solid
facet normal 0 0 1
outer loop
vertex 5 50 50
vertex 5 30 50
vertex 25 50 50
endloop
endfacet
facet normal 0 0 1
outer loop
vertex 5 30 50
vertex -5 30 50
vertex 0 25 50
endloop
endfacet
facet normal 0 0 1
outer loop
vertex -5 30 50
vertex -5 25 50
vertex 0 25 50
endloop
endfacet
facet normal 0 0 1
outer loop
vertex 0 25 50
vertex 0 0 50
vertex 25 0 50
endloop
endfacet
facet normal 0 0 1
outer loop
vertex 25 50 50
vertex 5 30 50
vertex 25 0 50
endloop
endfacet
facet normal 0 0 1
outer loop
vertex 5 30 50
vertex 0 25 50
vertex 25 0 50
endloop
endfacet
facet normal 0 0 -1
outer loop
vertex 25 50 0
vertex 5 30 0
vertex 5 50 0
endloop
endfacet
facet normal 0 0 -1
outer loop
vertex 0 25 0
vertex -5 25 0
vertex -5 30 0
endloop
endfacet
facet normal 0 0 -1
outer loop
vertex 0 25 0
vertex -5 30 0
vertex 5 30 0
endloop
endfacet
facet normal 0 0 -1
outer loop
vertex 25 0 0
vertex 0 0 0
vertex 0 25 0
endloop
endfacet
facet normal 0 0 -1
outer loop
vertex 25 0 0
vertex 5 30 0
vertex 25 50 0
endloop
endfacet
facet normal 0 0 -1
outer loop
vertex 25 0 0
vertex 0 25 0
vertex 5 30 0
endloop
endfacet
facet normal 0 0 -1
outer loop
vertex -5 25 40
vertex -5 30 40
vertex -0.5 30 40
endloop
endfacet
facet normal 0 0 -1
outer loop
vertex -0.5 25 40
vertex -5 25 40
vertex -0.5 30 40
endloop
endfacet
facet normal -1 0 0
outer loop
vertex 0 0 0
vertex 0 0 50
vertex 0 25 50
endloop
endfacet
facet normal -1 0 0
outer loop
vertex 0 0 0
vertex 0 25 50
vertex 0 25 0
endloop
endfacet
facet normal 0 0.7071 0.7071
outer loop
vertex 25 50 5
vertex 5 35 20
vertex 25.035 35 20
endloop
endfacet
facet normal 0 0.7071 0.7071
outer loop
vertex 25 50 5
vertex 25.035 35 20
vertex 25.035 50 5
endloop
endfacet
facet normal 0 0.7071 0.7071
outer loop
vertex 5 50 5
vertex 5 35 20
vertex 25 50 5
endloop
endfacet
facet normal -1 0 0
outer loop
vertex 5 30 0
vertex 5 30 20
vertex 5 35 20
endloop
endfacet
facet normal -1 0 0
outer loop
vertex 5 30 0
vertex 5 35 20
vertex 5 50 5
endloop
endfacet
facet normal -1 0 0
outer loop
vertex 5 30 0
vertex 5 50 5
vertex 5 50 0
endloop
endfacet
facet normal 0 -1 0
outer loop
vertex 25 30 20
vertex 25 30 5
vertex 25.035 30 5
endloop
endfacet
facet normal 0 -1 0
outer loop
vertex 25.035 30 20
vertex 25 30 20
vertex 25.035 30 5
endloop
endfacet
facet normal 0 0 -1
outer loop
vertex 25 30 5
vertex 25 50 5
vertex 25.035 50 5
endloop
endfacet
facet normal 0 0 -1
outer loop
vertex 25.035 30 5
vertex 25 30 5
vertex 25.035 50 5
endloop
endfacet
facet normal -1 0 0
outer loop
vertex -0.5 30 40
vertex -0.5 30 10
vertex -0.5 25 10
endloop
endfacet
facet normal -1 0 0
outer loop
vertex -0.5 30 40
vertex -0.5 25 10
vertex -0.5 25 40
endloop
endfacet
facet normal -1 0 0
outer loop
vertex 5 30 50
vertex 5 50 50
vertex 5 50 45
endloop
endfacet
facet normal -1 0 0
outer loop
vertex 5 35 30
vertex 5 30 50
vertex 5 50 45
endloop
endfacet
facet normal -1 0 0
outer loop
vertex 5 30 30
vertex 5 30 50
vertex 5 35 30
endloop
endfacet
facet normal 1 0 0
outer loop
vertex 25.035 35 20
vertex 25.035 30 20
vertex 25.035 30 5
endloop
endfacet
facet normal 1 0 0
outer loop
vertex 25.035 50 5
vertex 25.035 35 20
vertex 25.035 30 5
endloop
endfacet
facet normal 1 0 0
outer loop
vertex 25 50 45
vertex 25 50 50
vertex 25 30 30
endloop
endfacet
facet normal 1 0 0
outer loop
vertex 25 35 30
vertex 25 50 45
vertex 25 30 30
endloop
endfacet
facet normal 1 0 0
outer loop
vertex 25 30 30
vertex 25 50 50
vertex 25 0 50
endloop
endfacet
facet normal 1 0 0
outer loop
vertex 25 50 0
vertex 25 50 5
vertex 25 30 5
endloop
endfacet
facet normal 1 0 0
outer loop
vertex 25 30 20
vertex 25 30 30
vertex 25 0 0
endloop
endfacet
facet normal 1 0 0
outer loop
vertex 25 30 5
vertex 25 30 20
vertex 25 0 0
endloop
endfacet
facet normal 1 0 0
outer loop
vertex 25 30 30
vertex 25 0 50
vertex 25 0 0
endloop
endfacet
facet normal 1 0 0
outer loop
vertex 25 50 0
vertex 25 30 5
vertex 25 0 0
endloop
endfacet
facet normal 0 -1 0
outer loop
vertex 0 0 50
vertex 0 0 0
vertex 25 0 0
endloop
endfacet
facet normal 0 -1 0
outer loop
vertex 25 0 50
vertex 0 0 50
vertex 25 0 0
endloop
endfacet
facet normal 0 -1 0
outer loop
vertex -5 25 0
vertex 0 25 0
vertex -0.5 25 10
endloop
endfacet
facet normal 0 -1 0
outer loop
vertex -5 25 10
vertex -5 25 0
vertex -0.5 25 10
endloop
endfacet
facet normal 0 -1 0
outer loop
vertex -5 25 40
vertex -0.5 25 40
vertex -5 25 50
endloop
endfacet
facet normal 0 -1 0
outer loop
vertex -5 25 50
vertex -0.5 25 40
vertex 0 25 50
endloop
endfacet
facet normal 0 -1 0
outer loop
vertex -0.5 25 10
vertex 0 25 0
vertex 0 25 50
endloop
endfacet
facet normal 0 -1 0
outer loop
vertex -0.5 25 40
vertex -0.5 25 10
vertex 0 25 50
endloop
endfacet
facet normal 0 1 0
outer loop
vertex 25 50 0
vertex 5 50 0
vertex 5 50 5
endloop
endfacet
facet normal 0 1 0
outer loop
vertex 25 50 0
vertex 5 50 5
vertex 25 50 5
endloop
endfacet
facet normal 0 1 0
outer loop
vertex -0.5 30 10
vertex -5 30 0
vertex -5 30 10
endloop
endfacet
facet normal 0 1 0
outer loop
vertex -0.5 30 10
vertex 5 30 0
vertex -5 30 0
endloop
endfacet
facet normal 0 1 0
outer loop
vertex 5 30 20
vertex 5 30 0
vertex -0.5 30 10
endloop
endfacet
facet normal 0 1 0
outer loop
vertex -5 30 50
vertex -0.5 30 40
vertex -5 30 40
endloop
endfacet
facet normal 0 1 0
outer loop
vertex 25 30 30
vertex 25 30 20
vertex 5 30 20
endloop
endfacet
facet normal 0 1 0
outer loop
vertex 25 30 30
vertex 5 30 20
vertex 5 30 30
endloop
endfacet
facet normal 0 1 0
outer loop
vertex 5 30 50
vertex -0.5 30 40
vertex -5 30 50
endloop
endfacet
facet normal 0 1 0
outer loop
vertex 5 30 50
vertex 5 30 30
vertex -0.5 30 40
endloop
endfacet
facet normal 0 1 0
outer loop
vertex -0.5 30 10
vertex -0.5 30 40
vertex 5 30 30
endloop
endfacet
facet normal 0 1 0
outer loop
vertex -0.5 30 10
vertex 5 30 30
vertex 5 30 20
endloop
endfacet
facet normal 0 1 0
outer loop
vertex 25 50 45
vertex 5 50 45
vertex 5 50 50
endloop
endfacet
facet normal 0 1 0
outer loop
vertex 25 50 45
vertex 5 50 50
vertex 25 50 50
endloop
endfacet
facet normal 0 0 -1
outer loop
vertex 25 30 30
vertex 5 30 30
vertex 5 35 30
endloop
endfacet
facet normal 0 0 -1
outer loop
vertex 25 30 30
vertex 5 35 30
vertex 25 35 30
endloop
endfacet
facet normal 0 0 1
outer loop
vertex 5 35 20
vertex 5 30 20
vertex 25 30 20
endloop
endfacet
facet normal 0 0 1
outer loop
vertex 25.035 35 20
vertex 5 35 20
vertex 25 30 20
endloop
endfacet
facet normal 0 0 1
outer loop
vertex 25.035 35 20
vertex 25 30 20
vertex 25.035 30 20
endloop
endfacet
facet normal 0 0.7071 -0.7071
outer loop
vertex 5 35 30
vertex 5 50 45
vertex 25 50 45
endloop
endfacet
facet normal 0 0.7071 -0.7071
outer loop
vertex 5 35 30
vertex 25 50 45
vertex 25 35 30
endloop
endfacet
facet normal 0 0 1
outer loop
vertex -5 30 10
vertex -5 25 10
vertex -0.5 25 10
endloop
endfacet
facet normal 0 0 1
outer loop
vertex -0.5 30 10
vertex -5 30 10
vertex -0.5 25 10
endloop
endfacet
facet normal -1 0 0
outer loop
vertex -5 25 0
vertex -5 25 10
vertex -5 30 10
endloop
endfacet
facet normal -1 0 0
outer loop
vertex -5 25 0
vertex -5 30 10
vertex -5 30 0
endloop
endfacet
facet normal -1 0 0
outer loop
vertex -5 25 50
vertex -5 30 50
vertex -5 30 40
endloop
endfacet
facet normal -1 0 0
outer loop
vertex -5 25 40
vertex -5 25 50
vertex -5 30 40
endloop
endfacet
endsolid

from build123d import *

# Parameters (mm, degrees)
SKETCH1_W            = 25
SKETCH1_H            = 50
BOSS_EXTRUDE1_DEPTH  = 25
SKETCH2_W            = 5
SKETCH2_H            = 10
BOSS_EXTRUDE2_DEPTH  = 5
SKETCH3_W            = 25
SKETCH3_H            = 50
BOSS_EXTRUDE3_DEPTH  = 5
SKETCH4_W            = 5
SKETCH4_H            = 10
BOSS_EXTRUDE5_DEPTH  = 5
SKETCH6_W            = 30.0479401
SKETCH6_H            = 5
BOSS_EXTRUDE6_DEPTH  = 0.5
SKETCH8_W            = 20
SKETCH8_H            = 5
BOSS_EXTRUDE7_DEPTH  = 20
SKETCH18_W           = 20
SKETCH18_H           = 15
BOSS_EXTRUDE9_DEPTH  = 20
CUT_EXTRUDE7_DEPTH   = 20
SKETCH15_W           = 20.034641196
SKETCH15_H           = 15
SKETCH15_W_2         = 20
SKETCH15_H_2         = 20
BOSS_EXTRUDE11_DEPTH = 20
CUT_EXTRUDE9_DEPTH   = 30


with BuildPart() as part:
    # Sketch1 → Boss-Extrude1 (new body)
    with BuildSketch(Plane(origin=(0, 0, 0), x_dir=(1, 0, 0), z_dir=(0, 1, 0))):
        with Locations((12.5, -25)):
            Rectangle(SKETCH1_W, SKETCH1_H)
    extrude(amount=BOSS_EXTRUDE1_DEPTH)



with BuildPart() as body_2:
    # Sketch2 → Boss-Extrude2 (new body)
    with BuildSketch(Plane(origin=(0, 25, 0), x_dir=(1, 0, 0), z_dir=(0, 1, 0))):
        with Locations((-2.5, -5)):
            Rectangle(SKETCH2_W, SKETCH2_H)
    extrude(amount=BOSS_EXTRUDE2_DEPTH)


with BuildPart() as part_1:
    add(part.part)

    add(body_2.part)  # Boss-Extrude3 merges body 2
    # Sketch3 → Boss-Extrude3 (add)
    with BuildSketch(Plane(origin=(0, 25, 0), x_dir=(1, 0, 0), z_dir=(0, 1, 0))):
        with Locations((12.5, -25)):
            Rectangle(SKETCH3_W, SKETCH3_H)
    extrude(amount=BOSS_EXTRUDE3_DEPTH)

    # Sketch4 → Boss-Extrude5 (add)
    with BuildSketch(Plane(origin=(0, 30, 0), x_dir=(1, 0, 0), z_dir=(0, 1, 0))):
        with Locations((-2.5, -45)):
            Rectangle(SKETCH4_W, SKETCH4_H)
    extrude(amount=-BOSS_EXTRUDE5_DEPTH)

    # Sketch6 → Boss-Extrude6 (add)
    with BuildSketch(Plane.ZY):
        with Locations((25.02397005, 27.5)):
            Rectangle(SKETCH6_W, SKETCH6_H)
    extrude(amount=BOSS_EXTRUDE6_DEPTH)

    # Sketch8 → Boss-Extrude7 (add)
    with BuildSketch(Plane(origin=(0, 30, 0), x_dir=(1, 0, 0), z_dir=(0, 1, 0))):
        with Locations((15, -2.5)):
            Rectangle(SKETCH8_W, SKETCH8_H)
    extrude(amount=BOSS_EXTRUDE7_DEPTH)

    # Sketch18 → Boss-Extrude9 (add)
    with BuildSketch(Plane(origin=(0, 30, 0), x_dir=(1, 0, 0), z_dir=(0, 1, 0))):
        with Locations((15, -42.5)):
            Rectangle(SKETCH18_W, SKETCH18_H)
    extrude(amount=BOSS_EXTRUDE9_DEPTH)

    # Sketch20 → Cut-Extrude7 (cut)
    with BuildSketch(Plane.ZY.offset(-5)):
        Polygon((45, 50), (35, 35), (35, 50), align=None)
    extrude(amount=-CUT_EXTRUDE7_DEPTH, mode=Mode.SUBTRACT)

    # Sketch15 → Boss-Extrude11 (add)
    with BuildSketch(Plane(origin=(0, 30, 0), x_dir=(1, 0, 0), z_dir=(0, 1, 0))):
        with Locations((15.017320598, -12.5)):
            Rectangle(SKETCH15_W, SKETCH15_H)
        with Locations((15, -40)):
            Rectangle(SKETCH15_W_2, SKETCH15_H_2)
    extrude(amount=BOSS_EXTRUDE11_DEPTH)

    # Sketch21 → Cut-Extrude9 (cut)
    with BuildSketch(Plane.ZY.offset(-5)):
        Polygon((5, 50), (20, 50), (20, 35), align=None)
        Polygon((45, 50), (30, 35), (30, 50), align=None)
    extrude(amount=-CUT_EXTRUDE9_DEPTH, mode=Mode.SUBTRACT)


solid = part_1.part
